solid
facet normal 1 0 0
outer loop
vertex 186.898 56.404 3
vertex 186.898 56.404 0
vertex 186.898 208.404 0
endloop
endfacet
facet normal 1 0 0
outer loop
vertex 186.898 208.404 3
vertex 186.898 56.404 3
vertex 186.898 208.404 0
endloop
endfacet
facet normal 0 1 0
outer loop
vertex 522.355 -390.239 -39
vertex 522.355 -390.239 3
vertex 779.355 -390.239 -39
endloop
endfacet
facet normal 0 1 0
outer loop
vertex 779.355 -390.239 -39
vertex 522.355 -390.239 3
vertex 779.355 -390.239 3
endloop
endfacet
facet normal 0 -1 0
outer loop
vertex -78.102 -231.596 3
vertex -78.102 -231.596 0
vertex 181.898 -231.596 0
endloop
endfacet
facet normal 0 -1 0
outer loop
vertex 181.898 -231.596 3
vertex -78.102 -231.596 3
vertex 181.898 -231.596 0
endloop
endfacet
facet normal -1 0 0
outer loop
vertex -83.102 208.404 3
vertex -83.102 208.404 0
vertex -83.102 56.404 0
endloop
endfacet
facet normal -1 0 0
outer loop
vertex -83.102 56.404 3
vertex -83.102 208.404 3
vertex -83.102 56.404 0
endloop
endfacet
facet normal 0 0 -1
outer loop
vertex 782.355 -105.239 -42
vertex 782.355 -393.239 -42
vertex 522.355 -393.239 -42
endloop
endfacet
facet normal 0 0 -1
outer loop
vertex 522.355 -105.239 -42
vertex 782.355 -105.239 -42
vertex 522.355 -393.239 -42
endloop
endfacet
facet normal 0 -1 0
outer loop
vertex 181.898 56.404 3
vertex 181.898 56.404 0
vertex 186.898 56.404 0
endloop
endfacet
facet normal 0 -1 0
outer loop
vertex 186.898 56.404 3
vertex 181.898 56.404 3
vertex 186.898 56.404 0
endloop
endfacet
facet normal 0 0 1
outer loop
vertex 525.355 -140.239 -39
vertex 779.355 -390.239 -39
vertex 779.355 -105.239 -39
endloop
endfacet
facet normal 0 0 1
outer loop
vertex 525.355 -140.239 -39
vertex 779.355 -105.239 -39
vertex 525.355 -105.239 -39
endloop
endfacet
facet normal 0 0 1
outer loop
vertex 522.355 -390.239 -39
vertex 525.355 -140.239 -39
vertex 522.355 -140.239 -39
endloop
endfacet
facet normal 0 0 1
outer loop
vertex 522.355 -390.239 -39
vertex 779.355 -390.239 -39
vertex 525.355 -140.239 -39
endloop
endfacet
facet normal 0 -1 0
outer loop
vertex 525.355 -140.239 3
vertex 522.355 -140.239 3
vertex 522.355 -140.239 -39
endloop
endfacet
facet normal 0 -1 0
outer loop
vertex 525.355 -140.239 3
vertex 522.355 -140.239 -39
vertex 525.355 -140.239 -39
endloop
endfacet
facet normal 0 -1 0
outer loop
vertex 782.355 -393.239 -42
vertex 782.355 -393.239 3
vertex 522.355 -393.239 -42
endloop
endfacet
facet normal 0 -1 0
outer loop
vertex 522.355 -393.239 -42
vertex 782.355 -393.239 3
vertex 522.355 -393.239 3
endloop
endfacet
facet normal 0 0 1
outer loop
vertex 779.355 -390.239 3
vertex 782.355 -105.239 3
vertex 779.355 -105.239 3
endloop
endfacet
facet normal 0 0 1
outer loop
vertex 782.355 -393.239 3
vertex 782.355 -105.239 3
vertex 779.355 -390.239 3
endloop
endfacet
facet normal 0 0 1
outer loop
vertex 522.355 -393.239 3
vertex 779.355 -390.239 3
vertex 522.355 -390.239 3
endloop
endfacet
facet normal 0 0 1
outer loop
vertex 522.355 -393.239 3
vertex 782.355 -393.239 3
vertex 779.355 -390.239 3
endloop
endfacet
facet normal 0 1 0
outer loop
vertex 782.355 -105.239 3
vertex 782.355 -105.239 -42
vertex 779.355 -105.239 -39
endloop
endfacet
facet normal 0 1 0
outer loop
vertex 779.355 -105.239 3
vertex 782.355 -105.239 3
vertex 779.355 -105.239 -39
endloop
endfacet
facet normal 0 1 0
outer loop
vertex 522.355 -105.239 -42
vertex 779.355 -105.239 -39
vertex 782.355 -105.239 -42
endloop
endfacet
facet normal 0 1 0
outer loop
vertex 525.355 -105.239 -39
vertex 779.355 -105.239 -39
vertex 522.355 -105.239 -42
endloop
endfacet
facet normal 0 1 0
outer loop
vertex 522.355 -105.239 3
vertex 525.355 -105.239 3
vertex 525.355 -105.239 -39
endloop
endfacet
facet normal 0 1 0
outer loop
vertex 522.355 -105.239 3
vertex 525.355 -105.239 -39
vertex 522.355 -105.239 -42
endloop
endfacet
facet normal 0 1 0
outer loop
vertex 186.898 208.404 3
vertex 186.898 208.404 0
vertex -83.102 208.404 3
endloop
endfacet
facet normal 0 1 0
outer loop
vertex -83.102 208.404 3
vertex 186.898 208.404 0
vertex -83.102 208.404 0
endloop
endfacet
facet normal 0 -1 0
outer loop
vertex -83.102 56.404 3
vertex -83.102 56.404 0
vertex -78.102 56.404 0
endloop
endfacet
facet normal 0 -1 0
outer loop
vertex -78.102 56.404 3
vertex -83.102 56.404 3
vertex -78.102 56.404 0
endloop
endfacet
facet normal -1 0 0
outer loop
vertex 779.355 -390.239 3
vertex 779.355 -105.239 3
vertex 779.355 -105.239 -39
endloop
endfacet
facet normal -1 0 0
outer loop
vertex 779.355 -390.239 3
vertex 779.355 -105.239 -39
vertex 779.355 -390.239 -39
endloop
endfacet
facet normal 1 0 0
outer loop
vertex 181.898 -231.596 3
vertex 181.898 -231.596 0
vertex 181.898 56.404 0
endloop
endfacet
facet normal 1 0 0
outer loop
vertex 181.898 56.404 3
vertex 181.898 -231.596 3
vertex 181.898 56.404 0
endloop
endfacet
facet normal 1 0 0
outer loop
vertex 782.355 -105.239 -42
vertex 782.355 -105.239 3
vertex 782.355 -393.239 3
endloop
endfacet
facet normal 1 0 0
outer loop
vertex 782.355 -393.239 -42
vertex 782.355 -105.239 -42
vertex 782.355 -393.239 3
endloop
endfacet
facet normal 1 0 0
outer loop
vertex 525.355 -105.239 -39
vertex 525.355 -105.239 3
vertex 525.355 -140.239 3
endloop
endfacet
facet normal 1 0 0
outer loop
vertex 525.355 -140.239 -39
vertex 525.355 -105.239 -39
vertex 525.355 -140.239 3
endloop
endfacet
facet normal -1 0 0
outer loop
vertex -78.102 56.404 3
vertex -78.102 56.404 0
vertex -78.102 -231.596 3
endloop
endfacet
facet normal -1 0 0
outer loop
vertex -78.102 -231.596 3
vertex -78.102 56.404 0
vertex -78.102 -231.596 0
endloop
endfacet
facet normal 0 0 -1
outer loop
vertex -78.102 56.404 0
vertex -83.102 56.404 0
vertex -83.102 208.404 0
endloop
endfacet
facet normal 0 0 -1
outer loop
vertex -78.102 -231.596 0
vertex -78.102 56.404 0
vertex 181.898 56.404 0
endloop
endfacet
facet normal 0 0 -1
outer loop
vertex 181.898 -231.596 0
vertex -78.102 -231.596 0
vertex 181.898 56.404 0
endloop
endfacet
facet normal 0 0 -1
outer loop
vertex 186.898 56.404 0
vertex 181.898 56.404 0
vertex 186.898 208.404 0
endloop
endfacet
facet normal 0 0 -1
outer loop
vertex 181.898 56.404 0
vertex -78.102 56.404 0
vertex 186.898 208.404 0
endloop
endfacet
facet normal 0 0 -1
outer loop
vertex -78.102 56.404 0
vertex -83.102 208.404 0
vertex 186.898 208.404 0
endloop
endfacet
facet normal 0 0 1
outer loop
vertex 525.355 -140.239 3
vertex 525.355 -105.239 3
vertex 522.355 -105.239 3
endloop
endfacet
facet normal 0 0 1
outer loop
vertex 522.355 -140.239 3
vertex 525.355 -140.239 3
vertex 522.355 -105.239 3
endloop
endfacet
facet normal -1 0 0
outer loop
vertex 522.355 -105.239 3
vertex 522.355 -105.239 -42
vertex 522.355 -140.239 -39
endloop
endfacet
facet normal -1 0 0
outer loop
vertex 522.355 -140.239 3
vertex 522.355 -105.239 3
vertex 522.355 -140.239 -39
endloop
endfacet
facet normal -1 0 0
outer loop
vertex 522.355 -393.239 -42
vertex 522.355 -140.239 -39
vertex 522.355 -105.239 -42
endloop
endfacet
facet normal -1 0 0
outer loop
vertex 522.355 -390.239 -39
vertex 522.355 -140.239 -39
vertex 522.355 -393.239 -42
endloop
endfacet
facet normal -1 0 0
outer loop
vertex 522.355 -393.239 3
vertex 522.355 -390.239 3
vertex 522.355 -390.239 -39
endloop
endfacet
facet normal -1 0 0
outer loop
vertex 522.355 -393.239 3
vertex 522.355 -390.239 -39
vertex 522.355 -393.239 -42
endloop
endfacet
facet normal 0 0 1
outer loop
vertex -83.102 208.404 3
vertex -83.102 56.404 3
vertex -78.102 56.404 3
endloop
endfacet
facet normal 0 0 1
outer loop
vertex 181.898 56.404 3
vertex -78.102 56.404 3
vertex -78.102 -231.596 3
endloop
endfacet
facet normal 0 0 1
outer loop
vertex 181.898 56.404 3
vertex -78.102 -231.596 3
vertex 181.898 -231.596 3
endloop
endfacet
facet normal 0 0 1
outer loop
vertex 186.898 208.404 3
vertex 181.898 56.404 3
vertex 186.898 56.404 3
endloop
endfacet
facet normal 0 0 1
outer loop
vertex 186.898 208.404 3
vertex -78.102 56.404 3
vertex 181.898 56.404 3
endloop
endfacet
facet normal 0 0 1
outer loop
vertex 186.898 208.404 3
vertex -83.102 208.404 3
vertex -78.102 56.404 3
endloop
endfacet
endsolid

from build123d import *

# Parameters (mm, degrees)
F1_DEPTH = 3
F2_W     = 260
F2_H     = 288
F3_DEPTH = 45
F4_W     = 254
F4_H     = 285
F5_DEPTH = 42
F6_ANGLE = 180
F7_W     = 3
F7_H     = 250
F8_DEPTH = 42


with BuildPart() as f1:
    # F0 (on Top) → F1 (new body)
    with BuildSketch(Plane.XY):
        Polygon((186.898174, 208.404309), (-83.101826, 208.404309), (-83.101826, 56.404309), (-78.101826, 56.404309), (-78.101826, -231.595691), (181.898174, -231.595691), (181.898174, 56.404309), (186.898174, 56.404309), align=None)
    extrude(amount=F1_DEPTH)


with BuildPart() as f3:
    # F2 (on face) → F3 (new body)
    with BuildSketch(Plane.XY.offset(3)):
        with Locations((392.354662, 38.761406)):
            Rectangle(F2_W, F2_H)
    extrude(amount=-F3_DEPTH)

    # F4 (on face) → F5 (cut)
    with BuildSketch(Plane.XY.offset(3)):
        with Locations((392.354662, 37.261406)):
            Rectangle(F4_W, F4_H)
    extrude(amount=-F5_DEPTH, mode=Mode.SUBTRACT)


with BuildPart() as f3_1:
    # F6: moved
    add(f3.part.rotate(Axis((522.354662, -105.238594, -19.5), (0, 0, 1)), F6_ANGLE))

    # F7 (on face) → F8 (cut)
    with BuildSketch(Plane.XY.offset(3)):
        with Locations((523.854662, -265.238594)):
            Rectangle(F7_W, F7_H)
    extrude(amount=-F8_DEPTH, mode=Mode.SUBTRACT)


solid = Compound([f1.part, f3_1.part])
